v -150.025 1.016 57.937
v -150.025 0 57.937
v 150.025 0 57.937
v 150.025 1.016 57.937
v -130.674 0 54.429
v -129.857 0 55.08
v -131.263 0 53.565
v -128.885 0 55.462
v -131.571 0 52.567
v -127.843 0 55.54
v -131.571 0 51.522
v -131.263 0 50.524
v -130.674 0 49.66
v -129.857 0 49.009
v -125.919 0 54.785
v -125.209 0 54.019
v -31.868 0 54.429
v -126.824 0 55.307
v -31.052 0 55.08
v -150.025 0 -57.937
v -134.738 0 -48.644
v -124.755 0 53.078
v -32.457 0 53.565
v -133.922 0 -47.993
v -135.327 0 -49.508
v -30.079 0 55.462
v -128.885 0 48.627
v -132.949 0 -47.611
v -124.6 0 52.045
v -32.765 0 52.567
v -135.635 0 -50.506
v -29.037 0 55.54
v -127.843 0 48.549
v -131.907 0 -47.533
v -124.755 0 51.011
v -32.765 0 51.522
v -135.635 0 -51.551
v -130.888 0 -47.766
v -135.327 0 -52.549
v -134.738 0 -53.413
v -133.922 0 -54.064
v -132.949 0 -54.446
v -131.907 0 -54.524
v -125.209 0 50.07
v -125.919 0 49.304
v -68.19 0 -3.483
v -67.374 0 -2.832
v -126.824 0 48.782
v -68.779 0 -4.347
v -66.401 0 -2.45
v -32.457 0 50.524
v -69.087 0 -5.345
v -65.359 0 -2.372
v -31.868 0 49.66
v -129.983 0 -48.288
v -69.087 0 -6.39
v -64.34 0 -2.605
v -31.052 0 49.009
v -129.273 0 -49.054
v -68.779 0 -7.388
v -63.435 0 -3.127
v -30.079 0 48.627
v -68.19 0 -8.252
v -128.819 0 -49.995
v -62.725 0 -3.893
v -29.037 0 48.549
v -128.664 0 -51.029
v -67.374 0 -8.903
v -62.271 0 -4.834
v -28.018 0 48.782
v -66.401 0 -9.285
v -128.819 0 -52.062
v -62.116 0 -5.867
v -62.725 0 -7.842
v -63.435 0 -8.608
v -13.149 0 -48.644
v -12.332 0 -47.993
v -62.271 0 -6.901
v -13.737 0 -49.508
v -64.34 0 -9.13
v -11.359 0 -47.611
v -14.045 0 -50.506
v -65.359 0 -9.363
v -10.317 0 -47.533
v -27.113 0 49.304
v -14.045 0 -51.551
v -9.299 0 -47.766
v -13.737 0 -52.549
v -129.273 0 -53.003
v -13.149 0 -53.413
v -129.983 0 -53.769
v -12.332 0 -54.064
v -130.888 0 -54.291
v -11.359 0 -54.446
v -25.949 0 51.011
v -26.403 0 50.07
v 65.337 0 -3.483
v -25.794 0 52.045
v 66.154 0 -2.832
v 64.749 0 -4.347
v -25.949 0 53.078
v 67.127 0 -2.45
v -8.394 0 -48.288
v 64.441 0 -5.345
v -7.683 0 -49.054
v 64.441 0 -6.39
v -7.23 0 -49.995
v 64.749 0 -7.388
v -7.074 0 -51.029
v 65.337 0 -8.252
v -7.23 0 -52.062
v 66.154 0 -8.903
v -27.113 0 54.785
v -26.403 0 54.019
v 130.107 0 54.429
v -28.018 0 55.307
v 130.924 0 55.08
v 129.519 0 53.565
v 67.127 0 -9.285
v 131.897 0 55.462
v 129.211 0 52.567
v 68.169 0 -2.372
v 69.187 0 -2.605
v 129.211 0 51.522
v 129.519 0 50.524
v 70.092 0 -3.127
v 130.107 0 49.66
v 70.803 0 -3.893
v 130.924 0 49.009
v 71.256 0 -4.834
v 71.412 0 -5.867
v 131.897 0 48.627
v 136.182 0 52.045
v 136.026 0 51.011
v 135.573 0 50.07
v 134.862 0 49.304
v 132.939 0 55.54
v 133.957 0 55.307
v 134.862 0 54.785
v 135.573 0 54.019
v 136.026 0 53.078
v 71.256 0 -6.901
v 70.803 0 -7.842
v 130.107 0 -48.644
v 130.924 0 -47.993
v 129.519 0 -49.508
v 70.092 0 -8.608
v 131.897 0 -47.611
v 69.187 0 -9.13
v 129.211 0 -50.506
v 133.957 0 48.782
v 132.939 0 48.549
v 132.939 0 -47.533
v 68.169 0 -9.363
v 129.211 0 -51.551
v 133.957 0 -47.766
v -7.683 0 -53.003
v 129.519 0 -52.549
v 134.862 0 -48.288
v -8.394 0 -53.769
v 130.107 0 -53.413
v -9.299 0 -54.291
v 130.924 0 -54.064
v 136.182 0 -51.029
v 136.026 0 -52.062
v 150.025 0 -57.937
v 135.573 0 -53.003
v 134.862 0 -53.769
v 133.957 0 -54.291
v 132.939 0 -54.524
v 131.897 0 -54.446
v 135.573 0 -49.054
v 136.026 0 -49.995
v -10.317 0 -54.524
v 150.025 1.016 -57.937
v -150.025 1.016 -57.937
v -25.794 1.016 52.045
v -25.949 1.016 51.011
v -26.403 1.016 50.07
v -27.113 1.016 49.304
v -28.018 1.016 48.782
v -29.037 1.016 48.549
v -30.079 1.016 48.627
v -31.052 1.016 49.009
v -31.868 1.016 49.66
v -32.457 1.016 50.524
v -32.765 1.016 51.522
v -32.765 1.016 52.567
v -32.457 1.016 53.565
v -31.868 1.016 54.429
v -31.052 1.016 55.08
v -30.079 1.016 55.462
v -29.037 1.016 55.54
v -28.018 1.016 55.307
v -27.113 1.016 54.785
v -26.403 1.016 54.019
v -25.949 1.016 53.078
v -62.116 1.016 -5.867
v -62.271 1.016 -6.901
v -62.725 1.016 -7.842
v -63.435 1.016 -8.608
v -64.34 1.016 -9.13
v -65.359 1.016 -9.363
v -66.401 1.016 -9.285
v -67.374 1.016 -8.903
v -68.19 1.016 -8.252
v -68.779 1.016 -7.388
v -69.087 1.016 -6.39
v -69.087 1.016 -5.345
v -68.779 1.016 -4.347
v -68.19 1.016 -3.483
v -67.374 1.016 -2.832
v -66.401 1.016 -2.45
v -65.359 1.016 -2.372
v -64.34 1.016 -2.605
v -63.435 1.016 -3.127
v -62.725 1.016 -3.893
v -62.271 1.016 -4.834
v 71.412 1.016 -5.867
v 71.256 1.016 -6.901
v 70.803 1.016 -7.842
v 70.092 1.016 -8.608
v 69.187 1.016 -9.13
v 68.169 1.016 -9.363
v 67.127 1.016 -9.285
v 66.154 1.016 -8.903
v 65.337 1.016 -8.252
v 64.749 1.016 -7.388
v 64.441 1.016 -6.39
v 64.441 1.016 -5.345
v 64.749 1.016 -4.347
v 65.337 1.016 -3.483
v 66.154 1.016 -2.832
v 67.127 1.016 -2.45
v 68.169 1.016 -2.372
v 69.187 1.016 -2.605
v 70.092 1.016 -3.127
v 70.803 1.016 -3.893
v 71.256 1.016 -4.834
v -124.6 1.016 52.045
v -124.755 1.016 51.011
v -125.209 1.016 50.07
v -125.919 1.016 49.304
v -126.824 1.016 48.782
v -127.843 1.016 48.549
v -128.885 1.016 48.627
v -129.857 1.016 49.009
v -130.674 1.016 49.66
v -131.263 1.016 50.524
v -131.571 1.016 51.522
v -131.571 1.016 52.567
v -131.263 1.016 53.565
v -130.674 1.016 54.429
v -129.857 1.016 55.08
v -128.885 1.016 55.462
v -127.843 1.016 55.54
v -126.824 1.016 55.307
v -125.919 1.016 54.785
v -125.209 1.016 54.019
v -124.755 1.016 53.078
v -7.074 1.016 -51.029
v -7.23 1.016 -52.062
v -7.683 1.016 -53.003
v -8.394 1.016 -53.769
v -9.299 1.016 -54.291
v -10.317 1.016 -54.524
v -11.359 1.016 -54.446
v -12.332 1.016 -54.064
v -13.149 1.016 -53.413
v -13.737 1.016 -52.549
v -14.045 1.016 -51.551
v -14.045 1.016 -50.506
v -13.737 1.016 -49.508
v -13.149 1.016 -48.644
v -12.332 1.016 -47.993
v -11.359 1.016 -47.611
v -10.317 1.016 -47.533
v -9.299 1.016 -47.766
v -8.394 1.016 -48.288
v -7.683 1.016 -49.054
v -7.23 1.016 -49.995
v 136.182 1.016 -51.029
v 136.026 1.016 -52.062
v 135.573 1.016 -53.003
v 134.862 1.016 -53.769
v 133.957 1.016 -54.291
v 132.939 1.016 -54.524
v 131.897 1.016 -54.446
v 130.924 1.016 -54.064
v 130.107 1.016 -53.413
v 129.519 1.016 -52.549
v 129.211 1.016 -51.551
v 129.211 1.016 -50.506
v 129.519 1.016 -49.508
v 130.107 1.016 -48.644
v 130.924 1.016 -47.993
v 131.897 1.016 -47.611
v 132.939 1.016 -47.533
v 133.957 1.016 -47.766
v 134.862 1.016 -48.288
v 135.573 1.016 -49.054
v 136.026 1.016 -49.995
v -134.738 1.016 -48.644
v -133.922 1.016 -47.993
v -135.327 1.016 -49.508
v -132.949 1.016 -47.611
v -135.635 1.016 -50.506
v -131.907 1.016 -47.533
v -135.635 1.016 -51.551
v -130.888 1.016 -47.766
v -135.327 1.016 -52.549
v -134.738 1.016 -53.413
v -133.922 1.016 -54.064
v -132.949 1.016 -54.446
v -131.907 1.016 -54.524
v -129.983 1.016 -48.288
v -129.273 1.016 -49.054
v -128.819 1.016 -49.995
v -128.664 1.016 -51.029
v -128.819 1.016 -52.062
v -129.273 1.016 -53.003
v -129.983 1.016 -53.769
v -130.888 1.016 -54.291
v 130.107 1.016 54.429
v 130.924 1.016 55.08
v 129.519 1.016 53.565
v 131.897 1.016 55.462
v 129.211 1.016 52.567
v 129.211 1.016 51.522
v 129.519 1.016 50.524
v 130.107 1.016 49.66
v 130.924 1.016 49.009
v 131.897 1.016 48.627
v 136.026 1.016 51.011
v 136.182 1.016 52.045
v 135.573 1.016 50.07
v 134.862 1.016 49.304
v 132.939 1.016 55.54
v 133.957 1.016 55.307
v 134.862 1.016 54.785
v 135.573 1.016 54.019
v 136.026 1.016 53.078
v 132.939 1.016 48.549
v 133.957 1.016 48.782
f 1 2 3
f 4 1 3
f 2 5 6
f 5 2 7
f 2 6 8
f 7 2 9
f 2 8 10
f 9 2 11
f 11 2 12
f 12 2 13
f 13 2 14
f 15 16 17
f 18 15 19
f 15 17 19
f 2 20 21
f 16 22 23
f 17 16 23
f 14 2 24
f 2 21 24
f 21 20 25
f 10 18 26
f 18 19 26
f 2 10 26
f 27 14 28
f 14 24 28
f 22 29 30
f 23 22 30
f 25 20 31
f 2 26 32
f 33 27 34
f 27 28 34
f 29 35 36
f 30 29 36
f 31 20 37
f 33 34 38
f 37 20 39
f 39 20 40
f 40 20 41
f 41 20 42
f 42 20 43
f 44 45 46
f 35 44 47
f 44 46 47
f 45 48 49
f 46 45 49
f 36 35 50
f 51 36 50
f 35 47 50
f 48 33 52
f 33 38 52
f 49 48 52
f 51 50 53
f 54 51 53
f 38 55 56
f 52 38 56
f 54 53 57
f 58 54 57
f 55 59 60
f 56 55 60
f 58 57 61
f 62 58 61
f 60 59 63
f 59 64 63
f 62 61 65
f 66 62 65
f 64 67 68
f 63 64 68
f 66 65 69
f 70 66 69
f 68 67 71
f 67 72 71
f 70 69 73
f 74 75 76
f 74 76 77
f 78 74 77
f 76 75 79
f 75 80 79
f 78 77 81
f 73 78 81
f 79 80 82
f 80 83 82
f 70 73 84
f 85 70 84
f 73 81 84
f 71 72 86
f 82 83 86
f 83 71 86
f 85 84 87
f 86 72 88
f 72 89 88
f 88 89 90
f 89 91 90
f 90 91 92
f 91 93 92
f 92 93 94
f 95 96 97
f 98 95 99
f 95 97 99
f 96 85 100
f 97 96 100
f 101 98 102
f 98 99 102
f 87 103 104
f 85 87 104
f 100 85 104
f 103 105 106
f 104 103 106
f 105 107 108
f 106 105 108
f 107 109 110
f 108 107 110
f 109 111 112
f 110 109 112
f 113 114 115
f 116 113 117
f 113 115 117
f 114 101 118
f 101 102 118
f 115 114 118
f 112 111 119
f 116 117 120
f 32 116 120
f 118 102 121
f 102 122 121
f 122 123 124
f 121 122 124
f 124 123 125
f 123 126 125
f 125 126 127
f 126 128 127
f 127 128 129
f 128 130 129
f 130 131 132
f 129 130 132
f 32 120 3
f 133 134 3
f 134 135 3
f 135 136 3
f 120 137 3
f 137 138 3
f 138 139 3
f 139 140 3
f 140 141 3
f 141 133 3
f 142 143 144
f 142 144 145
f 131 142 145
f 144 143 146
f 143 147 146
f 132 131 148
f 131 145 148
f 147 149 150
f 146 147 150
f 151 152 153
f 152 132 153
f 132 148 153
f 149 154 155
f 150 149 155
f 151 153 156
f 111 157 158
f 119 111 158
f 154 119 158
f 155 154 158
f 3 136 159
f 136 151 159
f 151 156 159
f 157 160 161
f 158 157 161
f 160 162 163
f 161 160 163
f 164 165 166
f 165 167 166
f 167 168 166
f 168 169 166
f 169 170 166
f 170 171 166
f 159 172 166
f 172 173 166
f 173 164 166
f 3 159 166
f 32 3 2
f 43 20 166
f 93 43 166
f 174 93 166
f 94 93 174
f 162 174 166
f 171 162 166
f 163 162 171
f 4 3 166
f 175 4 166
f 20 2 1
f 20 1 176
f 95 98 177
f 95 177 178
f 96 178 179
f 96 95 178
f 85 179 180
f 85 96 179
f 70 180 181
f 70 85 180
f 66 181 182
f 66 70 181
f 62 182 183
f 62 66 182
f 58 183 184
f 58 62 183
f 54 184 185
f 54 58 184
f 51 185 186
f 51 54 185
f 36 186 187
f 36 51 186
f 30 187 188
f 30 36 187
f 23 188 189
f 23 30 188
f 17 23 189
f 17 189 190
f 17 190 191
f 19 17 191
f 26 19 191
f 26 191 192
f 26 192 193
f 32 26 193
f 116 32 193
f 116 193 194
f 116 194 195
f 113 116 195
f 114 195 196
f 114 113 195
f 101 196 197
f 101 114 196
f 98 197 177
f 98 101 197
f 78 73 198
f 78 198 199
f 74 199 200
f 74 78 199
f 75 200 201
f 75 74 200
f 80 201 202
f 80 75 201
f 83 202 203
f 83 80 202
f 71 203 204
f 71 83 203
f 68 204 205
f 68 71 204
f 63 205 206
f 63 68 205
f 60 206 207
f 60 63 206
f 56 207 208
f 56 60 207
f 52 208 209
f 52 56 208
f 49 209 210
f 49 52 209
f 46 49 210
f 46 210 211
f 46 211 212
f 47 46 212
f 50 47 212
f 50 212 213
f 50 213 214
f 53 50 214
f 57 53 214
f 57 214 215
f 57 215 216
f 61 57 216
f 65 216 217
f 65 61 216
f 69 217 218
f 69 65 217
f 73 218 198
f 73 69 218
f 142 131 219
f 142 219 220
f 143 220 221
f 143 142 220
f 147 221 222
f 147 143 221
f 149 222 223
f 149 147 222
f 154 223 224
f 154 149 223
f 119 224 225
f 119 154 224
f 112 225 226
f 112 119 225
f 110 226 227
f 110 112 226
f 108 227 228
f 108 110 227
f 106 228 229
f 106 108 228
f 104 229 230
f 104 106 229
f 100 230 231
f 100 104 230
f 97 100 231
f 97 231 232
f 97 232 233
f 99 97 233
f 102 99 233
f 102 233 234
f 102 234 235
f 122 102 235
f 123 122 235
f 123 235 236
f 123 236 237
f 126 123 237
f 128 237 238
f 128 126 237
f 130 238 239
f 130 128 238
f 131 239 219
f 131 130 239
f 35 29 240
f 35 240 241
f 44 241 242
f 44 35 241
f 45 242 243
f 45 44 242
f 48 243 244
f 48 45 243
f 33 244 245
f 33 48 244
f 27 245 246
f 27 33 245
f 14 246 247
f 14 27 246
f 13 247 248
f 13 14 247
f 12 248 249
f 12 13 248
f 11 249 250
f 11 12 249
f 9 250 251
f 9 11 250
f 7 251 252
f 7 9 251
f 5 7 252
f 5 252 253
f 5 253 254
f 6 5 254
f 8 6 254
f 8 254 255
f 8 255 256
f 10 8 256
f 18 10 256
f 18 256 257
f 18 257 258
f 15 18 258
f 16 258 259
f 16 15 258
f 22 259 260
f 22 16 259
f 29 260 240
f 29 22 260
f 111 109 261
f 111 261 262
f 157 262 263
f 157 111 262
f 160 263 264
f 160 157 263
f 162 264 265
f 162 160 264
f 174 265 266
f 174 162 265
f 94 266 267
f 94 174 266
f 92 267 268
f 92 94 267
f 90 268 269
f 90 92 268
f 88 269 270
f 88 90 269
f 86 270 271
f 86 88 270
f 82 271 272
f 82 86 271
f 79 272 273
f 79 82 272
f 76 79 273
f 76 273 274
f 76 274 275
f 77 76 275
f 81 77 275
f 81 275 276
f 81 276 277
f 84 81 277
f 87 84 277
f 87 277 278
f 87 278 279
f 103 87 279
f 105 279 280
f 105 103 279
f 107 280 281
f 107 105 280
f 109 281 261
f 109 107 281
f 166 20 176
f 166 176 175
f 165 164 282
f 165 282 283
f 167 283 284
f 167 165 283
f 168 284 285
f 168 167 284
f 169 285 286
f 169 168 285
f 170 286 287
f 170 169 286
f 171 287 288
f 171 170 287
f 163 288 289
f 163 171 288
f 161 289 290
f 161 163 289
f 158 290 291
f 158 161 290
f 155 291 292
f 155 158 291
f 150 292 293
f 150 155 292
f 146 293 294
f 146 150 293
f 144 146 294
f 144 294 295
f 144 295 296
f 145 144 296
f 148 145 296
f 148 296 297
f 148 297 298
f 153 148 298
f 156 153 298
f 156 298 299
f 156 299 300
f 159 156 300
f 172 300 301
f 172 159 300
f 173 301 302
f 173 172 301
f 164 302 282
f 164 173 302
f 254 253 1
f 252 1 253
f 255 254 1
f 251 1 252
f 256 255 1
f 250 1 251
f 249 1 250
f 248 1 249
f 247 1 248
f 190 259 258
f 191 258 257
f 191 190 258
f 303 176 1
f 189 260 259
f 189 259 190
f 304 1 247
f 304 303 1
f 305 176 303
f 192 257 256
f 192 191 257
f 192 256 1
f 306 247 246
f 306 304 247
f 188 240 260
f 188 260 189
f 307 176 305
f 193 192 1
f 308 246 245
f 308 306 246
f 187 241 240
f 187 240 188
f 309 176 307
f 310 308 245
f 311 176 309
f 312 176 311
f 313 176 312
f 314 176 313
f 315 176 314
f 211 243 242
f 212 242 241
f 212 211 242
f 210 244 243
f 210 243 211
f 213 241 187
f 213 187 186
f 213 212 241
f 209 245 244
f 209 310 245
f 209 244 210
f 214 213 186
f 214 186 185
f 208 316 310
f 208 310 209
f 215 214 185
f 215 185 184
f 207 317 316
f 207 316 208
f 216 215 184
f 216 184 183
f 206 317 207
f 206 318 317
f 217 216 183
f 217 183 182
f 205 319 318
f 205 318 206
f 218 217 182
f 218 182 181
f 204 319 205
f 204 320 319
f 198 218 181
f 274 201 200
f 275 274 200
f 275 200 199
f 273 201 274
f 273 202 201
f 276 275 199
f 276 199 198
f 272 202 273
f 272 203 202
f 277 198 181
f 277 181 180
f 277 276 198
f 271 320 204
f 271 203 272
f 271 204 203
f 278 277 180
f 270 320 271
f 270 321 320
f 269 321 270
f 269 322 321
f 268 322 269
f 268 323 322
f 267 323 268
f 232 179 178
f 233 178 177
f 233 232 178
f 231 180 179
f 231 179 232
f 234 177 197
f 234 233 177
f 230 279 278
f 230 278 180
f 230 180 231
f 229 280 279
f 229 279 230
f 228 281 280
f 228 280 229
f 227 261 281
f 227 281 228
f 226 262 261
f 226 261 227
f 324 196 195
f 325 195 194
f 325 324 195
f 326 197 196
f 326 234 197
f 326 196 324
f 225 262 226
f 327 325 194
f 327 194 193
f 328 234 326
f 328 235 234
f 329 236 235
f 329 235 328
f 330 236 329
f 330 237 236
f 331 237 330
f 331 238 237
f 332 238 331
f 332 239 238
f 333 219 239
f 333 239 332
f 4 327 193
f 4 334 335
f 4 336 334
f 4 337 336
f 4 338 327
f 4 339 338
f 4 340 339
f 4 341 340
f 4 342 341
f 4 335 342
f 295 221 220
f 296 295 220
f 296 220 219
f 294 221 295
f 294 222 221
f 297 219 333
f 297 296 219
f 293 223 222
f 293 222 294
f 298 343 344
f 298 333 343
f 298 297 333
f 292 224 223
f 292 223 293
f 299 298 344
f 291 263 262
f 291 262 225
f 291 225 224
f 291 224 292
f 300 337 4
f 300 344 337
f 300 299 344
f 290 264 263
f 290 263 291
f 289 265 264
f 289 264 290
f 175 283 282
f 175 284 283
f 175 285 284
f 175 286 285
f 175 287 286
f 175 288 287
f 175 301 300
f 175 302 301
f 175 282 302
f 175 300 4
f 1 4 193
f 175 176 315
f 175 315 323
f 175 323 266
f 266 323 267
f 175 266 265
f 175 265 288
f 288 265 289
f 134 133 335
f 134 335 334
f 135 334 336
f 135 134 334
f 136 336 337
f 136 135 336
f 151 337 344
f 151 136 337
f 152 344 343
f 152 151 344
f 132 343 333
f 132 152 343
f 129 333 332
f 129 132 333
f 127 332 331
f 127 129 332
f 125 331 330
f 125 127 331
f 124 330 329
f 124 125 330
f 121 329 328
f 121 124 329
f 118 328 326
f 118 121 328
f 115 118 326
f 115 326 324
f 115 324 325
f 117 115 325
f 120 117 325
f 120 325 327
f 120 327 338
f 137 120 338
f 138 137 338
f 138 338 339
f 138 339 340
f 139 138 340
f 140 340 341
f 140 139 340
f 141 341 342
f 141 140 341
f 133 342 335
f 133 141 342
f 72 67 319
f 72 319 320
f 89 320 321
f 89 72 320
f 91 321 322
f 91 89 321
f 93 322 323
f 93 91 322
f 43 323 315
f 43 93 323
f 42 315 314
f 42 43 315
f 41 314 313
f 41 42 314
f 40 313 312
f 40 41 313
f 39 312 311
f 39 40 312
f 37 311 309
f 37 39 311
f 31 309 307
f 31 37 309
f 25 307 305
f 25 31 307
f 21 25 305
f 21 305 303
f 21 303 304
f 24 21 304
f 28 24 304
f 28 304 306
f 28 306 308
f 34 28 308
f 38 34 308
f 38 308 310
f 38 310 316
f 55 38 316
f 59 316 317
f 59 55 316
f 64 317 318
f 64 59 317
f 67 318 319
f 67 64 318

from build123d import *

# Parameters (mm, degrees)
CROQUIS1_W              = 300.0502
CROQUIS1_H              = 115.8748
CROQUIS1_R              = 3.5052
SALIENTE_EXTRUIR1_DEPTH = 1.016


with BuildPart() as part:
    # Croquis1 → Saliente-Extruir1 (new body)
    with BuildSketch(Plane(origin=(0, 0, 0), x_dir=(1, 0, 0), z_dir=(0, 1, 0))):
        Rectangle(CROQUIS1_W, CROQUIS1_H)
        with Locations((-128.1049, -52.0446)):
            Circle(CROQUIS1_R, mode=Mode.SUBTRACT)
        with Locations((-132.1689, 51.0286)):
            Circle(CROQUIS1_R, mode=Mode.SUBTRACT)
        with Locations((-10.5791, 51.0286)):
            Circle(CROQUIS1_R, mode=Mode.SUBTRACT)
        with Locations((132.6769, 51.0286)):
            Circle(CROQUIS1_R, mode=Mode.SUBTRACT)
        with Locations((132.6769, -52.0446)):
            Circle(CROQUIS1_R, mode=Mode.SUBTRACT)
        with Locations((-29.2989, -52.0446)):
            Circle(CROQUIS1_R, mode=Mode.SUBTRACT)
        with Locations((67.9069, 5.8674)):
            Circle(CROQUIS1_R, mode=Mode.SUBTRACT)
        with Locations((-65.6209, 5.8674)):
            Circle(CROQUIS1_R, mode=Mode.SUBTRACT)
    extrude(amount=SALIENTE_EXTRUIR1_DEPTH)


solid = part.part
